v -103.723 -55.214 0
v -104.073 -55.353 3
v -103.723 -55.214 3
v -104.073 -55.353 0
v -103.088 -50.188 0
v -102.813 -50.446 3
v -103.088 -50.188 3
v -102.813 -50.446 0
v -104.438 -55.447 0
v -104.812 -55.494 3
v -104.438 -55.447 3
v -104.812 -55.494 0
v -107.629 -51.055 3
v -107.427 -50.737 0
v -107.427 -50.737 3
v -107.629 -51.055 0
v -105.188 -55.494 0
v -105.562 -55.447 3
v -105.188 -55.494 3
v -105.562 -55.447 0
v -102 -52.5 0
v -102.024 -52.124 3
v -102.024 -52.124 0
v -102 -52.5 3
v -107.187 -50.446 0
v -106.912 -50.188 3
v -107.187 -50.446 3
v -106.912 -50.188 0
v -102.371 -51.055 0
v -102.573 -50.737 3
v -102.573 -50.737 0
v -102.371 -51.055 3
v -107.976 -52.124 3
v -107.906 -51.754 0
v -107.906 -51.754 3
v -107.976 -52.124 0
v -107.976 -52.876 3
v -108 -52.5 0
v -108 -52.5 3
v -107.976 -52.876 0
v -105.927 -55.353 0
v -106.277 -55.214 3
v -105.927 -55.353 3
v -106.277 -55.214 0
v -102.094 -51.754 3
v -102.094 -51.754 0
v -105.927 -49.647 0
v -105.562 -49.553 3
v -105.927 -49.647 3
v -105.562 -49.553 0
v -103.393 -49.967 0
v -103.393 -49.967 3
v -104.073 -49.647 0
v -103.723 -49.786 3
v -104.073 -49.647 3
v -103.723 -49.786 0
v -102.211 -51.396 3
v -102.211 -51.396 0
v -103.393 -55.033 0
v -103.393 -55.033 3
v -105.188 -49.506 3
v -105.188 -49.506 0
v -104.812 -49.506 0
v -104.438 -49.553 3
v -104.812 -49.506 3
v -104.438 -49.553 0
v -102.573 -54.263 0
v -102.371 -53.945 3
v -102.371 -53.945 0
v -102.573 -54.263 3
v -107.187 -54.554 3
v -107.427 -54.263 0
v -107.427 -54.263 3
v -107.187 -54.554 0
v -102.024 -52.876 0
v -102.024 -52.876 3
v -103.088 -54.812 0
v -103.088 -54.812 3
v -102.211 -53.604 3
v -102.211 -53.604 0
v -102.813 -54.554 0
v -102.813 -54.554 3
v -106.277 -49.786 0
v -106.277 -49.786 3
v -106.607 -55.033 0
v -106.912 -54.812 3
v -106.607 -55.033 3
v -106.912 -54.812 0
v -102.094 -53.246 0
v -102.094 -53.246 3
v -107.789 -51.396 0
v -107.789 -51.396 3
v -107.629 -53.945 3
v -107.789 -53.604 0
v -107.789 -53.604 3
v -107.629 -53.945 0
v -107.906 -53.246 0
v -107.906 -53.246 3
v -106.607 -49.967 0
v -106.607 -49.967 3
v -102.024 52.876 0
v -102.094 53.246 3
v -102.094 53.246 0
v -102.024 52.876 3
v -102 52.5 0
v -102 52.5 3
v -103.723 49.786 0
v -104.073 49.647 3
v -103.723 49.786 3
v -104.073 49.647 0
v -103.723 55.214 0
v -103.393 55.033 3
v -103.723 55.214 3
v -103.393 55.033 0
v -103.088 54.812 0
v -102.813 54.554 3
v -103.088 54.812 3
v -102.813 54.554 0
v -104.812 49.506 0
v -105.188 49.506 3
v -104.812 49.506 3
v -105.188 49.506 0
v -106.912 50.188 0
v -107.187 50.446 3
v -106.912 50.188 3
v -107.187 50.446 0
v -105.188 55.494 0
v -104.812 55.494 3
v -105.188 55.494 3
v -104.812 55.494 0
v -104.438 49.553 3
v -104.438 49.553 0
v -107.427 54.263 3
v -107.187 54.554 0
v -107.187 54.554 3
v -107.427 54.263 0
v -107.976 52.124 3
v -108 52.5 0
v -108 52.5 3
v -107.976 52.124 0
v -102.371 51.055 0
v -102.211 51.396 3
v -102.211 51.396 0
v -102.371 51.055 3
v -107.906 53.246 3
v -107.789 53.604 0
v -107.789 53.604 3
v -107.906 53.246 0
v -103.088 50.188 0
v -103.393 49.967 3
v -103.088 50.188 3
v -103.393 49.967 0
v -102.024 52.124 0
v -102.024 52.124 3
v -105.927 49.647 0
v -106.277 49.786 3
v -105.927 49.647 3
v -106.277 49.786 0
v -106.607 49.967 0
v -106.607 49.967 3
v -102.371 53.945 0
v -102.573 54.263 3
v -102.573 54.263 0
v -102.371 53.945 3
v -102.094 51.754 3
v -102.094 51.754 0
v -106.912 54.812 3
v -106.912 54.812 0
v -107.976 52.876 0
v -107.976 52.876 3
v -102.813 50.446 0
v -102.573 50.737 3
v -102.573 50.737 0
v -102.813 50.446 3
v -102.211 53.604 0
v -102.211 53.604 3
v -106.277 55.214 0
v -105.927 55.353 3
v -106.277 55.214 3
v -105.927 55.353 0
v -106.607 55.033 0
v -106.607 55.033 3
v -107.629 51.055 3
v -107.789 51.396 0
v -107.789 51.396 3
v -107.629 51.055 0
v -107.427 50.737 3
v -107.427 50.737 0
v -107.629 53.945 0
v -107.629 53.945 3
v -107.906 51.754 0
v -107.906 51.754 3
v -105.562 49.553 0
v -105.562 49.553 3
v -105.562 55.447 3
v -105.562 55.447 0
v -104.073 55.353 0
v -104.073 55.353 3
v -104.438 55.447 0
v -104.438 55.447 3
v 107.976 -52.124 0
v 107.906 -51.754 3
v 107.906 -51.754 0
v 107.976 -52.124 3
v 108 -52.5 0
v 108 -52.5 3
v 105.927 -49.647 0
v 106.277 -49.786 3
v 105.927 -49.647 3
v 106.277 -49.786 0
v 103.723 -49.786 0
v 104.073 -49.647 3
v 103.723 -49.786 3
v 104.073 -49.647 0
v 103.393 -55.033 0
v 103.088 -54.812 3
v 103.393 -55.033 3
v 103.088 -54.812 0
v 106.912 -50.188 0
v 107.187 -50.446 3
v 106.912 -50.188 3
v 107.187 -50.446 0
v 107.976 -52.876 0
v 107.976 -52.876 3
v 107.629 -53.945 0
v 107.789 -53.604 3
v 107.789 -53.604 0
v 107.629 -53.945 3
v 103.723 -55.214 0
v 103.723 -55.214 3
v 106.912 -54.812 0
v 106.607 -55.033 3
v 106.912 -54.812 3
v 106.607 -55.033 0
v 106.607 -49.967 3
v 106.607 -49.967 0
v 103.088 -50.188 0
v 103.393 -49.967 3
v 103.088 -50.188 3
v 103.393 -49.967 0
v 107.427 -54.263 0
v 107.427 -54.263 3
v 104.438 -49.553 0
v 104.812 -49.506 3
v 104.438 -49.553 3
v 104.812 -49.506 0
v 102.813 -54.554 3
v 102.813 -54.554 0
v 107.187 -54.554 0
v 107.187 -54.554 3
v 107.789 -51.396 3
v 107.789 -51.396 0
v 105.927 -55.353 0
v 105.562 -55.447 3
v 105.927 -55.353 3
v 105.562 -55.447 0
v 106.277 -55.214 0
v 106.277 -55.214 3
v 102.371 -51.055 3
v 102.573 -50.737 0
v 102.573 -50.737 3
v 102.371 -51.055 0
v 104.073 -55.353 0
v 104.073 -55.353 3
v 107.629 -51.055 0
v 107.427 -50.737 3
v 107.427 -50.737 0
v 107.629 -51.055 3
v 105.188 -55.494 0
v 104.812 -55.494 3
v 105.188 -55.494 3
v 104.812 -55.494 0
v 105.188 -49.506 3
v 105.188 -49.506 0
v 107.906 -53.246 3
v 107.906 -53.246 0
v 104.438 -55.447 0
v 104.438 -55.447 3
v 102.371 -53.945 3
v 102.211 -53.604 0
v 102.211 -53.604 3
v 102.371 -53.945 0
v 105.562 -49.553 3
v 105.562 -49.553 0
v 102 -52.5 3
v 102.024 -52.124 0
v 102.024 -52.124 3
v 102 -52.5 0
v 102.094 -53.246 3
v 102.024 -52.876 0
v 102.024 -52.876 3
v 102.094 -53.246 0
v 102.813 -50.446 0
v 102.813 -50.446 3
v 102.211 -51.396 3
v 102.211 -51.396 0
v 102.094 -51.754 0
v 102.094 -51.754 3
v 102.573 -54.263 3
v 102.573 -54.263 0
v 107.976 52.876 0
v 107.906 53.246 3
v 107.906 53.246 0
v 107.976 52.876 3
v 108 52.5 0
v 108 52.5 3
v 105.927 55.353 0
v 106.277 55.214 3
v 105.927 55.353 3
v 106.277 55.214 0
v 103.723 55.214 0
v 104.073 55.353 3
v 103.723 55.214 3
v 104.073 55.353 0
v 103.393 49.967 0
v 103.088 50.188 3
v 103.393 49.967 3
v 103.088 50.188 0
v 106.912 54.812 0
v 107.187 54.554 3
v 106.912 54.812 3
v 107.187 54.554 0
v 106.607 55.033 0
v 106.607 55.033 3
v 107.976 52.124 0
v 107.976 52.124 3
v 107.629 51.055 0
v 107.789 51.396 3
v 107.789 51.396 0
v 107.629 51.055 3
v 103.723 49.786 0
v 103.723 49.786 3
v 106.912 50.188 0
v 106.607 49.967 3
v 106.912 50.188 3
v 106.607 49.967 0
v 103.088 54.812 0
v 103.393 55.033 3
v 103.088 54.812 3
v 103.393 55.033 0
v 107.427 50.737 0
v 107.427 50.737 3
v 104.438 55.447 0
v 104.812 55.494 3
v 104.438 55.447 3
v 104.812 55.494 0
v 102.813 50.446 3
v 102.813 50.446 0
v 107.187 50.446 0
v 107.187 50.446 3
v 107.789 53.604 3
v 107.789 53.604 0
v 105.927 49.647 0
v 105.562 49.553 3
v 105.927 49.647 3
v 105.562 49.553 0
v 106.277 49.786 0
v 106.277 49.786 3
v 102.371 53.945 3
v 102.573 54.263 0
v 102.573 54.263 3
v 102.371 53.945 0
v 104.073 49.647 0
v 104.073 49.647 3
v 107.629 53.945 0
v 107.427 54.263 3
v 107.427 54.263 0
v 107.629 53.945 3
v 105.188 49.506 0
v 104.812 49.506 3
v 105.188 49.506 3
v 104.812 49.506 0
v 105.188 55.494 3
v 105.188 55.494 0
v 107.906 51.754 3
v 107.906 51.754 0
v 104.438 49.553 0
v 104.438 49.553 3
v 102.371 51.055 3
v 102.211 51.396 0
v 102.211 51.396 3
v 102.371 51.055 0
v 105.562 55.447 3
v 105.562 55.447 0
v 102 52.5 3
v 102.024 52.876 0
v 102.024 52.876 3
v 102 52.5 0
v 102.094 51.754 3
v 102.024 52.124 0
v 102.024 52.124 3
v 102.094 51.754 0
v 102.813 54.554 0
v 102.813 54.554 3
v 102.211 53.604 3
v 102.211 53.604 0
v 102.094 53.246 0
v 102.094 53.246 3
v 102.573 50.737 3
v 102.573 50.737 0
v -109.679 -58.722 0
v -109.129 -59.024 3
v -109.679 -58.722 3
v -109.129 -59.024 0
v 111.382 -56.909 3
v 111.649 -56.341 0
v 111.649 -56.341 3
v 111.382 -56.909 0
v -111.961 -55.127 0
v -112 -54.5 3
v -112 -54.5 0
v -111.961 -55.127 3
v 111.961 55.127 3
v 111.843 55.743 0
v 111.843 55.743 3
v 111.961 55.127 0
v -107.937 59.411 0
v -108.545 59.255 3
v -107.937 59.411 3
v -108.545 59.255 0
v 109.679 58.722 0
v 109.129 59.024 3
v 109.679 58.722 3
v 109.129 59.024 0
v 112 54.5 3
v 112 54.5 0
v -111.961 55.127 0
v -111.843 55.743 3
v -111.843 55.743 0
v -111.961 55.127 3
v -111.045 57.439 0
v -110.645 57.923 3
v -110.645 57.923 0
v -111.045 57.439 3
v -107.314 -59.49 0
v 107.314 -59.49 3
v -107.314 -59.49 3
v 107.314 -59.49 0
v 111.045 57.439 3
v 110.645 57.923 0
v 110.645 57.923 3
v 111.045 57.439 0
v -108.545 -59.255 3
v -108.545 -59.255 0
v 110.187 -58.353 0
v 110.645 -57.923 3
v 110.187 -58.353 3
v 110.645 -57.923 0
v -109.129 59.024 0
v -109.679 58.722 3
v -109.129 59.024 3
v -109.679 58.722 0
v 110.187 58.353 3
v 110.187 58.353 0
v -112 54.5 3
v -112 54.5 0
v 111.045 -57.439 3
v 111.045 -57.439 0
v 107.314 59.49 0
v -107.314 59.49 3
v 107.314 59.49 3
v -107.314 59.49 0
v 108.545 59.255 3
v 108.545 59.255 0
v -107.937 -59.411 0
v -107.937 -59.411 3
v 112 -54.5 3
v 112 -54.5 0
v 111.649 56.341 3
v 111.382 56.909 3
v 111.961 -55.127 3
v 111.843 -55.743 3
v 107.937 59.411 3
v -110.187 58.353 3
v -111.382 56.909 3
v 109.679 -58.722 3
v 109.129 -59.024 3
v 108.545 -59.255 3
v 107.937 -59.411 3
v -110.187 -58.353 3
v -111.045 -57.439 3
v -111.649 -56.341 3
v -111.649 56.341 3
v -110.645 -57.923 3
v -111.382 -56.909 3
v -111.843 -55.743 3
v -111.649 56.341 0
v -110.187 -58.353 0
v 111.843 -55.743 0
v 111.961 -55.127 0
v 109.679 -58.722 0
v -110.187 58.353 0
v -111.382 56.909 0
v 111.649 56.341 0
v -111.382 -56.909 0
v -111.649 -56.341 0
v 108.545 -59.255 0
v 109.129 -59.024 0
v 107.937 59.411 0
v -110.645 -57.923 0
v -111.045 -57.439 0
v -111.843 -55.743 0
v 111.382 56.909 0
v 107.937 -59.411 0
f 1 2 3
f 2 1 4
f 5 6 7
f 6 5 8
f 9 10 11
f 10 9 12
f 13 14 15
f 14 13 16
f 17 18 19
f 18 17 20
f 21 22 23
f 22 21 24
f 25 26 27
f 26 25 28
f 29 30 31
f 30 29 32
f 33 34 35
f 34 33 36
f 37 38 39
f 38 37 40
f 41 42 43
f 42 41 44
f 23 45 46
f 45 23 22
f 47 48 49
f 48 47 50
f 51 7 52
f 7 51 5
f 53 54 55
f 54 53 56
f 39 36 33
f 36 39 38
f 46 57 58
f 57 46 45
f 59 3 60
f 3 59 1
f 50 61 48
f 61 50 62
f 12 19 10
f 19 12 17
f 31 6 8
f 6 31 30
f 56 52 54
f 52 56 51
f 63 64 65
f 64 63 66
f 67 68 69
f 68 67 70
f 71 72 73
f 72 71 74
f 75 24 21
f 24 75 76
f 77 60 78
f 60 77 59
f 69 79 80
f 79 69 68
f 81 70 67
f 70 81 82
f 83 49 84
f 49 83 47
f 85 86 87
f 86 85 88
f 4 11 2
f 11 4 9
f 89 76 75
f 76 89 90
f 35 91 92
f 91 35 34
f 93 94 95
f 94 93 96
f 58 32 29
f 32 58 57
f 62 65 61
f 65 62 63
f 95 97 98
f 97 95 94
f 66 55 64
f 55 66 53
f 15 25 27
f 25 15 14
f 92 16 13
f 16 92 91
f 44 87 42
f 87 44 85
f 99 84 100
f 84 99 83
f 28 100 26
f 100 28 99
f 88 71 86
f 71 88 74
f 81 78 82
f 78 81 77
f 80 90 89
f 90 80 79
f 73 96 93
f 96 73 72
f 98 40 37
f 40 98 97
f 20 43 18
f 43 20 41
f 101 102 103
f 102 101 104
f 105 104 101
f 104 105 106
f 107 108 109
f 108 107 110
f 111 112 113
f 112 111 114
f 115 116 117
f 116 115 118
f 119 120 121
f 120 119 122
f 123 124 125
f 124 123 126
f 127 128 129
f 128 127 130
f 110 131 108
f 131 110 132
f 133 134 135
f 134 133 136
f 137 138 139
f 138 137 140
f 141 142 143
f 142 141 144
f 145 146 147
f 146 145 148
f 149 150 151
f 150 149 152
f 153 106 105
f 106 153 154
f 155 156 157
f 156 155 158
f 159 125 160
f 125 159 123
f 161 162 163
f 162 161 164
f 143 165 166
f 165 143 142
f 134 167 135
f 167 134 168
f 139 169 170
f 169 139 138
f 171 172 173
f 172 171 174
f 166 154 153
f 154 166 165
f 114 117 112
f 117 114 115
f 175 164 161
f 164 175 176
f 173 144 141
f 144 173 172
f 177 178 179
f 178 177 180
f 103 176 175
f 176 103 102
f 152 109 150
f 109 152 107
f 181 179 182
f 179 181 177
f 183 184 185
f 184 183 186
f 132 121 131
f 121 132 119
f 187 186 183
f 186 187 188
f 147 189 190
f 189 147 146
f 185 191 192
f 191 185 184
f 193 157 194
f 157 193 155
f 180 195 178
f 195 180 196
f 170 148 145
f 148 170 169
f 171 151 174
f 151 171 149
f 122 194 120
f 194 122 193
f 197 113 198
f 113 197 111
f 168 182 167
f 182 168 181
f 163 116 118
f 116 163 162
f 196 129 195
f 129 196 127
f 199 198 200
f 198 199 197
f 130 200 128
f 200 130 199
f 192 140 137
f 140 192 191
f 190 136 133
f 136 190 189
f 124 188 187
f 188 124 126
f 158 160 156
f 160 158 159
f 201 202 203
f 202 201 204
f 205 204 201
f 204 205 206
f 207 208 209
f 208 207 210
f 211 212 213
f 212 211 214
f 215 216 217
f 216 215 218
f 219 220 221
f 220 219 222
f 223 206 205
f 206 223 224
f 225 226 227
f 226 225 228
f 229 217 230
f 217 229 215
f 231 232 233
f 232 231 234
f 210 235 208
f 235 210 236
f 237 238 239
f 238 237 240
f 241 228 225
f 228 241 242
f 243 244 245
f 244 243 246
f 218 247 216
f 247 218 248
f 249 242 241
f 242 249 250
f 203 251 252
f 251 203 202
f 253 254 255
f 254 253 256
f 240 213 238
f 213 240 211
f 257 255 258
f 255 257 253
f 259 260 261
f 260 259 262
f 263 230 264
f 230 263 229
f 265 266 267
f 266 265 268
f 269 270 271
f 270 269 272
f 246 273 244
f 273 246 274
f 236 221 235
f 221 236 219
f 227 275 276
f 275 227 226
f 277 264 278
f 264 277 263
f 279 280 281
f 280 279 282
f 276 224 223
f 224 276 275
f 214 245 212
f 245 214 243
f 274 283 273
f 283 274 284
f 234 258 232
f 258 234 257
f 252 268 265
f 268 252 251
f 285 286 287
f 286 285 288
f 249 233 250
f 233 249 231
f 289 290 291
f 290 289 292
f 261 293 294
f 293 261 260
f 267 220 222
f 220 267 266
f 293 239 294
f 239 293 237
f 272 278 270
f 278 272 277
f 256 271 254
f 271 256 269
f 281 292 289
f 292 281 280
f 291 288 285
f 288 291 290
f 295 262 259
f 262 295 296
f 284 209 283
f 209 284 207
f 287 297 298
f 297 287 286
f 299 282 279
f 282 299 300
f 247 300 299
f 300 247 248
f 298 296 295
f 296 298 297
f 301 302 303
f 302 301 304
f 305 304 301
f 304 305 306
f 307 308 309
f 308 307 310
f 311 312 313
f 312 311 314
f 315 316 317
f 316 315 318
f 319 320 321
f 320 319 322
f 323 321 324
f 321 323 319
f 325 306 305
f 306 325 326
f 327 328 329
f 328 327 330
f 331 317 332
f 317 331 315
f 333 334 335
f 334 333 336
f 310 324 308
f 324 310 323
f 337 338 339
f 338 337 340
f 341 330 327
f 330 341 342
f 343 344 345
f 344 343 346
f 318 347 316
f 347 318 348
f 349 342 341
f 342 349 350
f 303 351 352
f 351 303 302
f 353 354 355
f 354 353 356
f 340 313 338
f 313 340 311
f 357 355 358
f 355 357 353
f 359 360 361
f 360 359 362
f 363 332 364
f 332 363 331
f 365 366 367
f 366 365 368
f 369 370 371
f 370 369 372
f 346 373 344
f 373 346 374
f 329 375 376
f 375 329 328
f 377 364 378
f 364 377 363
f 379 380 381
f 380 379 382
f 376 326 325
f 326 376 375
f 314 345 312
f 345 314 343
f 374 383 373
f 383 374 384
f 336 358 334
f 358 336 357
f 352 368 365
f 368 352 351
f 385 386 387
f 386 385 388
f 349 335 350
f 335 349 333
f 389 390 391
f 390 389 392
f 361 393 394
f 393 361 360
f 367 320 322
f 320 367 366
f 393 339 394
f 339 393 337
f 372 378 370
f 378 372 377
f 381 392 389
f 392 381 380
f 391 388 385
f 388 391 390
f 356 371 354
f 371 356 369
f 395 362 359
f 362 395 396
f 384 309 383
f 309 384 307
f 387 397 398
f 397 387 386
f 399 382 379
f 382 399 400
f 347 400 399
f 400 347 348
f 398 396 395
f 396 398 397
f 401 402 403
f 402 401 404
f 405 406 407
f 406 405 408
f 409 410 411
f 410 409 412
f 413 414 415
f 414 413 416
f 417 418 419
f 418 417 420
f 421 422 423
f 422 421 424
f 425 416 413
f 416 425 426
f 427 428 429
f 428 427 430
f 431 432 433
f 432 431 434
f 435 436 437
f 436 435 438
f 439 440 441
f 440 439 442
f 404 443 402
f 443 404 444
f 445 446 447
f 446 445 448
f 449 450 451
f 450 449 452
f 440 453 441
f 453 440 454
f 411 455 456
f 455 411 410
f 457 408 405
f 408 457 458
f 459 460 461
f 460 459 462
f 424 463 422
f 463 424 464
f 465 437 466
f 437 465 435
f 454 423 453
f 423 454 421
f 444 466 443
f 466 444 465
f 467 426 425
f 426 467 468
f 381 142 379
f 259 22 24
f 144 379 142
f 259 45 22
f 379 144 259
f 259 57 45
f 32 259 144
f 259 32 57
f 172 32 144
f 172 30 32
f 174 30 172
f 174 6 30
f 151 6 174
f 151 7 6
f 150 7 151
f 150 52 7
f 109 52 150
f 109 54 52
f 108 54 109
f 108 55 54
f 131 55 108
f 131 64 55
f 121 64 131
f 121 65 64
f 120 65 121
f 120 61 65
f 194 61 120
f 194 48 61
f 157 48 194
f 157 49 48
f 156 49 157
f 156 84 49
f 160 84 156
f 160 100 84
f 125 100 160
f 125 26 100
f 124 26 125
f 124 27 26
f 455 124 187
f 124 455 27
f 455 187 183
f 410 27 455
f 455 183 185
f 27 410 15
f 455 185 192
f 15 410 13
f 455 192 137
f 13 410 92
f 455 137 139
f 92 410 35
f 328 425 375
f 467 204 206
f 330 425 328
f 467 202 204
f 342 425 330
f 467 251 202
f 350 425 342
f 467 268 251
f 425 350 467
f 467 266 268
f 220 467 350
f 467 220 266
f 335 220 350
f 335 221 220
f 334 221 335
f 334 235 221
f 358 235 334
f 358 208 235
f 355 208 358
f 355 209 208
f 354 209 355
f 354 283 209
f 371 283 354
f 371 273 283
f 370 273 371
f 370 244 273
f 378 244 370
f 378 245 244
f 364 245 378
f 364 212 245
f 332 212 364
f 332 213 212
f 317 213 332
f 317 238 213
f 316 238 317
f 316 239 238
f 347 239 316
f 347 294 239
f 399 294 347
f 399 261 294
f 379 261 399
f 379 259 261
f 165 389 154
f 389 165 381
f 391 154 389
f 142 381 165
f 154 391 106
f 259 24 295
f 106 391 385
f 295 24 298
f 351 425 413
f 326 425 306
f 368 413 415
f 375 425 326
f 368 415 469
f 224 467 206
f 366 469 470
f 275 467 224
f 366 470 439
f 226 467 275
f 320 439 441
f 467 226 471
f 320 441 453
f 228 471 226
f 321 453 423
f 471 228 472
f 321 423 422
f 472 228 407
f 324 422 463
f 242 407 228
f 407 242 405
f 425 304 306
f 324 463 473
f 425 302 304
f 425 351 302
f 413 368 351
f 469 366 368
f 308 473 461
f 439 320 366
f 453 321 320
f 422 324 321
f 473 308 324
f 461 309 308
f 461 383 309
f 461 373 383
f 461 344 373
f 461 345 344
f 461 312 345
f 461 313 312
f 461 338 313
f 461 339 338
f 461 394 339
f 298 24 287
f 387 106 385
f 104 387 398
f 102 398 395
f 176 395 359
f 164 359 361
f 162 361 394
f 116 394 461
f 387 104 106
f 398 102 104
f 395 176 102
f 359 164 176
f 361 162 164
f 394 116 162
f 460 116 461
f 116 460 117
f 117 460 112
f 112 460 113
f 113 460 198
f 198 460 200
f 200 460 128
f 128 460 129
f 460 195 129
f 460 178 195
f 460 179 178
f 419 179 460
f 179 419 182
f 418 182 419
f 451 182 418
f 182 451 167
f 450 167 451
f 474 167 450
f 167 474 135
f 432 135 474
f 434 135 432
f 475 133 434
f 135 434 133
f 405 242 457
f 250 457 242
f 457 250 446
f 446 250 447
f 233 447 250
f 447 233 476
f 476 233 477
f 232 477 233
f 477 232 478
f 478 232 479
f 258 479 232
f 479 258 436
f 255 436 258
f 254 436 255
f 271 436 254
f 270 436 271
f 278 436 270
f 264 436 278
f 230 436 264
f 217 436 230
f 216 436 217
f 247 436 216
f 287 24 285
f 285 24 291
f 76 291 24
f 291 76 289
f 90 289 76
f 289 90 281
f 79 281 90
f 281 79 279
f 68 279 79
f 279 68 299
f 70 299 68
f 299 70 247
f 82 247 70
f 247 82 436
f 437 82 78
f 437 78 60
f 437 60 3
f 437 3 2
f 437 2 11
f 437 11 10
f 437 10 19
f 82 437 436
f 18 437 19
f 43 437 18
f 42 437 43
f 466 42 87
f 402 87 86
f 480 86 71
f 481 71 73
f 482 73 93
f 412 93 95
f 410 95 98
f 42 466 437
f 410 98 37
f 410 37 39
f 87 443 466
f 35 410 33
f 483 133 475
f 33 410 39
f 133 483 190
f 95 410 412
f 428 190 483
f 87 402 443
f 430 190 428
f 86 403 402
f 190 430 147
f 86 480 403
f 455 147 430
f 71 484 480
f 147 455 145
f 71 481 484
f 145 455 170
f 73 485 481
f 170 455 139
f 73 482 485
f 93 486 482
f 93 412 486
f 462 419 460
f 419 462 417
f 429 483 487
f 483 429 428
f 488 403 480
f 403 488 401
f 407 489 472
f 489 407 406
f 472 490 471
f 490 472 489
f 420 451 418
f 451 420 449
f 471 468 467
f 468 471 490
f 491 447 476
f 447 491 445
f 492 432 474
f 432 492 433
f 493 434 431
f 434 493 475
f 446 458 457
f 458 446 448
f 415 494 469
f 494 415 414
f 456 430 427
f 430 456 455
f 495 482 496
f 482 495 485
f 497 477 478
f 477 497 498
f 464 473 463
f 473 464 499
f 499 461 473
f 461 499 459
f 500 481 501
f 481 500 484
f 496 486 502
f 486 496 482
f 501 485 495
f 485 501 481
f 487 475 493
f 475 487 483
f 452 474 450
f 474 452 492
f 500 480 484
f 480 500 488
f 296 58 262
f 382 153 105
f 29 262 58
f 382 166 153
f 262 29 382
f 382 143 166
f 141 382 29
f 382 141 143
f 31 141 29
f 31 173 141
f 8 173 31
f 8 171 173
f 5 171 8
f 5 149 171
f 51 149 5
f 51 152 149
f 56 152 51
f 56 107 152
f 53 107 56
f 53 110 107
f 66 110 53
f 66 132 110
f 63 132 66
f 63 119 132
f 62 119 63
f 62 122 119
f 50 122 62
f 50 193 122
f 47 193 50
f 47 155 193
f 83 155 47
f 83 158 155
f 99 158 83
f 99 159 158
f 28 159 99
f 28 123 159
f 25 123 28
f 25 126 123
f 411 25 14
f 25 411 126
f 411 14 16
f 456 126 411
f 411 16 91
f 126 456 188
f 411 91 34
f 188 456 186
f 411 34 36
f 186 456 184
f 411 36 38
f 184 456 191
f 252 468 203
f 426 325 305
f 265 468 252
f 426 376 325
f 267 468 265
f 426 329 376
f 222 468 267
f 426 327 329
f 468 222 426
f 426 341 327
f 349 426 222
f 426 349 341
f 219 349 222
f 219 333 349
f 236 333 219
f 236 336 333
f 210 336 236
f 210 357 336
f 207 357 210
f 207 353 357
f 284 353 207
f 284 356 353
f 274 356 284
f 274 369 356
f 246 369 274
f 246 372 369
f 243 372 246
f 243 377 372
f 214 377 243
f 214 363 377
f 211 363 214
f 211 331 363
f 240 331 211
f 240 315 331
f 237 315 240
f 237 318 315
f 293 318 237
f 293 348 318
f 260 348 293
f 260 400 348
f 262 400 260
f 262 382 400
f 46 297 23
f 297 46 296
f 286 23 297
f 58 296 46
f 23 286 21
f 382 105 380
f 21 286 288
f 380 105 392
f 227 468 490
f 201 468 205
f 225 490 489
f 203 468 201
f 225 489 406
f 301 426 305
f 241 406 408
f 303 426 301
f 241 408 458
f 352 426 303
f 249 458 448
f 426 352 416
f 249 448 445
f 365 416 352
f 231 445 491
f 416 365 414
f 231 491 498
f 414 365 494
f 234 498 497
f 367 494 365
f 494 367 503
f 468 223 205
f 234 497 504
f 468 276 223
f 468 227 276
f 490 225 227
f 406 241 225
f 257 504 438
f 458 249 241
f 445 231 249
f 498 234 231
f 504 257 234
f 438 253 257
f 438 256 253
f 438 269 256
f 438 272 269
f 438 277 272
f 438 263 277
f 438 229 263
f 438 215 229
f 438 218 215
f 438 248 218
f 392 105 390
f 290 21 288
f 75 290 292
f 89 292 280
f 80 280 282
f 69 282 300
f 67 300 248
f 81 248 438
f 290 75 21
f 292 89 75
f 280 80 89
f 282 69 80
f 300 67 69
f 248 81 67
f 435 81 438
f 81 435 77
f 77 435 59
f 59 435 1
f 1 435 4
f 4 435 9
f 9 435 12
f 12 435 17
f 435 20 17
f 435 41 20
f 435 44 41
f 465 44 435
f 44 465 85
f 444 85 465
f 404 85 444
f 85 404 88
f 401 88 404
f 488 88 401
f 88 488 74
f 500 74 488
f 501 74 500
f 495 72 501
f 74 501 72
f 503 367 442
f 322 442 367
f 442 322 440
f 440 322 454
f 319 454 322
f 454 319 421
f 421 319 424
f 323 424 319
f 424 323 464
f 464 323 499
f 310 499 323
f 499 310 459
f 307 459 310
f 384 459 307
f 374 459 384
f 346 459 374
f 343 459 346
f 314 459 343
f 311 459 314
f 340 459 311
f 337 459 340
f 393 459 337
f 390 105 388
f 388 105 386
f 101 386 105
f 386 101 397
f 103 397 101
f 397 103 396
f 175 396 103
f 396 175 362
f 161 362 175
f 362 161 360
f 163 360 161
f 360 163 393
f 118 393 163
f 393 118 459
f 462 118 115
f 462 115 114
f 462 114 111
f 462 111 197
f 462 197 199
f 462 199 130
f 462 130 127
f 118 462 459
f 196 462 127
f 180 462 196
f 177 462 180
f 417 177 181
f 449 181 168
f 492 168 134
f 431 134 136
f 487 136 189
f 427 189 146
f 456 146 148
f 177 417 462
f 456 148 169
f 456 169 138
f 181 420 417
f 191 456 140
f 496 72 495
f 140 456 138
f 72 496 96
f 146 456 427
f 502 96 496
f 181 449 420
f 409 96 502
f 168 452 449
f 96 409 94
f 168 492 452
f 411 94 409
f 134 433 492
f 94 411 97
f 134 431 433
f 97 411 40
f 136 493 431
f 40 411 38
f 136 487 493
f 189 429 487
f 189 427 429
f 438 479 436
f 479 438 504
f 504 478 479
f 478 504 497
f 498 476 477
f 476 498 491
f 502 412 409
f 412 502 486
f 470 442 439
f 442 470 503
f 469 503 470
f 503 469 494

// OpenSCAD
$fn = 50;


difference() {
	union() {
		hull() {
			translate(v = [-107.0000000000, 54.5000000000, 0]) {
				cylinder(h = 3, r = 5);
			}
			translate(v = [107.0000000000, 54.5000000000, 0]) {
				cylinder(h = 3, r = 5);
			}
			translate(v = [-107.0000000000, -54.5000000000, 0]) {
				cylinder(h = 3, r = 5);
			}
			translate(v = [107.0000000000, -54.5000000000, 0]) {
				cylinder(h = 3, r = 5);
			}
		}
	}
	union() {
		translate(v = [-105.0000000000, -52.5000000000, -100.0000000000]) {
			cylinder(h = 200, r = 3.0000000000);
		}
		translate(v = [-105.0000000000, 52.5000000000, -100.0000000000]) {
			cylinder(h = 200, r = 3.0000000000);
		}
		translate(v = [105.0000000000, -52.5000000000, -100.0000000000]) {
			cylinder(h = 200, r = 3.0000000000);
		}
		translate(v = [105.0000000000, 52.5000000000, -100.0000000000]) {
			cylinder(h = 200, r = 3.0000000000);
		}
	}
}
